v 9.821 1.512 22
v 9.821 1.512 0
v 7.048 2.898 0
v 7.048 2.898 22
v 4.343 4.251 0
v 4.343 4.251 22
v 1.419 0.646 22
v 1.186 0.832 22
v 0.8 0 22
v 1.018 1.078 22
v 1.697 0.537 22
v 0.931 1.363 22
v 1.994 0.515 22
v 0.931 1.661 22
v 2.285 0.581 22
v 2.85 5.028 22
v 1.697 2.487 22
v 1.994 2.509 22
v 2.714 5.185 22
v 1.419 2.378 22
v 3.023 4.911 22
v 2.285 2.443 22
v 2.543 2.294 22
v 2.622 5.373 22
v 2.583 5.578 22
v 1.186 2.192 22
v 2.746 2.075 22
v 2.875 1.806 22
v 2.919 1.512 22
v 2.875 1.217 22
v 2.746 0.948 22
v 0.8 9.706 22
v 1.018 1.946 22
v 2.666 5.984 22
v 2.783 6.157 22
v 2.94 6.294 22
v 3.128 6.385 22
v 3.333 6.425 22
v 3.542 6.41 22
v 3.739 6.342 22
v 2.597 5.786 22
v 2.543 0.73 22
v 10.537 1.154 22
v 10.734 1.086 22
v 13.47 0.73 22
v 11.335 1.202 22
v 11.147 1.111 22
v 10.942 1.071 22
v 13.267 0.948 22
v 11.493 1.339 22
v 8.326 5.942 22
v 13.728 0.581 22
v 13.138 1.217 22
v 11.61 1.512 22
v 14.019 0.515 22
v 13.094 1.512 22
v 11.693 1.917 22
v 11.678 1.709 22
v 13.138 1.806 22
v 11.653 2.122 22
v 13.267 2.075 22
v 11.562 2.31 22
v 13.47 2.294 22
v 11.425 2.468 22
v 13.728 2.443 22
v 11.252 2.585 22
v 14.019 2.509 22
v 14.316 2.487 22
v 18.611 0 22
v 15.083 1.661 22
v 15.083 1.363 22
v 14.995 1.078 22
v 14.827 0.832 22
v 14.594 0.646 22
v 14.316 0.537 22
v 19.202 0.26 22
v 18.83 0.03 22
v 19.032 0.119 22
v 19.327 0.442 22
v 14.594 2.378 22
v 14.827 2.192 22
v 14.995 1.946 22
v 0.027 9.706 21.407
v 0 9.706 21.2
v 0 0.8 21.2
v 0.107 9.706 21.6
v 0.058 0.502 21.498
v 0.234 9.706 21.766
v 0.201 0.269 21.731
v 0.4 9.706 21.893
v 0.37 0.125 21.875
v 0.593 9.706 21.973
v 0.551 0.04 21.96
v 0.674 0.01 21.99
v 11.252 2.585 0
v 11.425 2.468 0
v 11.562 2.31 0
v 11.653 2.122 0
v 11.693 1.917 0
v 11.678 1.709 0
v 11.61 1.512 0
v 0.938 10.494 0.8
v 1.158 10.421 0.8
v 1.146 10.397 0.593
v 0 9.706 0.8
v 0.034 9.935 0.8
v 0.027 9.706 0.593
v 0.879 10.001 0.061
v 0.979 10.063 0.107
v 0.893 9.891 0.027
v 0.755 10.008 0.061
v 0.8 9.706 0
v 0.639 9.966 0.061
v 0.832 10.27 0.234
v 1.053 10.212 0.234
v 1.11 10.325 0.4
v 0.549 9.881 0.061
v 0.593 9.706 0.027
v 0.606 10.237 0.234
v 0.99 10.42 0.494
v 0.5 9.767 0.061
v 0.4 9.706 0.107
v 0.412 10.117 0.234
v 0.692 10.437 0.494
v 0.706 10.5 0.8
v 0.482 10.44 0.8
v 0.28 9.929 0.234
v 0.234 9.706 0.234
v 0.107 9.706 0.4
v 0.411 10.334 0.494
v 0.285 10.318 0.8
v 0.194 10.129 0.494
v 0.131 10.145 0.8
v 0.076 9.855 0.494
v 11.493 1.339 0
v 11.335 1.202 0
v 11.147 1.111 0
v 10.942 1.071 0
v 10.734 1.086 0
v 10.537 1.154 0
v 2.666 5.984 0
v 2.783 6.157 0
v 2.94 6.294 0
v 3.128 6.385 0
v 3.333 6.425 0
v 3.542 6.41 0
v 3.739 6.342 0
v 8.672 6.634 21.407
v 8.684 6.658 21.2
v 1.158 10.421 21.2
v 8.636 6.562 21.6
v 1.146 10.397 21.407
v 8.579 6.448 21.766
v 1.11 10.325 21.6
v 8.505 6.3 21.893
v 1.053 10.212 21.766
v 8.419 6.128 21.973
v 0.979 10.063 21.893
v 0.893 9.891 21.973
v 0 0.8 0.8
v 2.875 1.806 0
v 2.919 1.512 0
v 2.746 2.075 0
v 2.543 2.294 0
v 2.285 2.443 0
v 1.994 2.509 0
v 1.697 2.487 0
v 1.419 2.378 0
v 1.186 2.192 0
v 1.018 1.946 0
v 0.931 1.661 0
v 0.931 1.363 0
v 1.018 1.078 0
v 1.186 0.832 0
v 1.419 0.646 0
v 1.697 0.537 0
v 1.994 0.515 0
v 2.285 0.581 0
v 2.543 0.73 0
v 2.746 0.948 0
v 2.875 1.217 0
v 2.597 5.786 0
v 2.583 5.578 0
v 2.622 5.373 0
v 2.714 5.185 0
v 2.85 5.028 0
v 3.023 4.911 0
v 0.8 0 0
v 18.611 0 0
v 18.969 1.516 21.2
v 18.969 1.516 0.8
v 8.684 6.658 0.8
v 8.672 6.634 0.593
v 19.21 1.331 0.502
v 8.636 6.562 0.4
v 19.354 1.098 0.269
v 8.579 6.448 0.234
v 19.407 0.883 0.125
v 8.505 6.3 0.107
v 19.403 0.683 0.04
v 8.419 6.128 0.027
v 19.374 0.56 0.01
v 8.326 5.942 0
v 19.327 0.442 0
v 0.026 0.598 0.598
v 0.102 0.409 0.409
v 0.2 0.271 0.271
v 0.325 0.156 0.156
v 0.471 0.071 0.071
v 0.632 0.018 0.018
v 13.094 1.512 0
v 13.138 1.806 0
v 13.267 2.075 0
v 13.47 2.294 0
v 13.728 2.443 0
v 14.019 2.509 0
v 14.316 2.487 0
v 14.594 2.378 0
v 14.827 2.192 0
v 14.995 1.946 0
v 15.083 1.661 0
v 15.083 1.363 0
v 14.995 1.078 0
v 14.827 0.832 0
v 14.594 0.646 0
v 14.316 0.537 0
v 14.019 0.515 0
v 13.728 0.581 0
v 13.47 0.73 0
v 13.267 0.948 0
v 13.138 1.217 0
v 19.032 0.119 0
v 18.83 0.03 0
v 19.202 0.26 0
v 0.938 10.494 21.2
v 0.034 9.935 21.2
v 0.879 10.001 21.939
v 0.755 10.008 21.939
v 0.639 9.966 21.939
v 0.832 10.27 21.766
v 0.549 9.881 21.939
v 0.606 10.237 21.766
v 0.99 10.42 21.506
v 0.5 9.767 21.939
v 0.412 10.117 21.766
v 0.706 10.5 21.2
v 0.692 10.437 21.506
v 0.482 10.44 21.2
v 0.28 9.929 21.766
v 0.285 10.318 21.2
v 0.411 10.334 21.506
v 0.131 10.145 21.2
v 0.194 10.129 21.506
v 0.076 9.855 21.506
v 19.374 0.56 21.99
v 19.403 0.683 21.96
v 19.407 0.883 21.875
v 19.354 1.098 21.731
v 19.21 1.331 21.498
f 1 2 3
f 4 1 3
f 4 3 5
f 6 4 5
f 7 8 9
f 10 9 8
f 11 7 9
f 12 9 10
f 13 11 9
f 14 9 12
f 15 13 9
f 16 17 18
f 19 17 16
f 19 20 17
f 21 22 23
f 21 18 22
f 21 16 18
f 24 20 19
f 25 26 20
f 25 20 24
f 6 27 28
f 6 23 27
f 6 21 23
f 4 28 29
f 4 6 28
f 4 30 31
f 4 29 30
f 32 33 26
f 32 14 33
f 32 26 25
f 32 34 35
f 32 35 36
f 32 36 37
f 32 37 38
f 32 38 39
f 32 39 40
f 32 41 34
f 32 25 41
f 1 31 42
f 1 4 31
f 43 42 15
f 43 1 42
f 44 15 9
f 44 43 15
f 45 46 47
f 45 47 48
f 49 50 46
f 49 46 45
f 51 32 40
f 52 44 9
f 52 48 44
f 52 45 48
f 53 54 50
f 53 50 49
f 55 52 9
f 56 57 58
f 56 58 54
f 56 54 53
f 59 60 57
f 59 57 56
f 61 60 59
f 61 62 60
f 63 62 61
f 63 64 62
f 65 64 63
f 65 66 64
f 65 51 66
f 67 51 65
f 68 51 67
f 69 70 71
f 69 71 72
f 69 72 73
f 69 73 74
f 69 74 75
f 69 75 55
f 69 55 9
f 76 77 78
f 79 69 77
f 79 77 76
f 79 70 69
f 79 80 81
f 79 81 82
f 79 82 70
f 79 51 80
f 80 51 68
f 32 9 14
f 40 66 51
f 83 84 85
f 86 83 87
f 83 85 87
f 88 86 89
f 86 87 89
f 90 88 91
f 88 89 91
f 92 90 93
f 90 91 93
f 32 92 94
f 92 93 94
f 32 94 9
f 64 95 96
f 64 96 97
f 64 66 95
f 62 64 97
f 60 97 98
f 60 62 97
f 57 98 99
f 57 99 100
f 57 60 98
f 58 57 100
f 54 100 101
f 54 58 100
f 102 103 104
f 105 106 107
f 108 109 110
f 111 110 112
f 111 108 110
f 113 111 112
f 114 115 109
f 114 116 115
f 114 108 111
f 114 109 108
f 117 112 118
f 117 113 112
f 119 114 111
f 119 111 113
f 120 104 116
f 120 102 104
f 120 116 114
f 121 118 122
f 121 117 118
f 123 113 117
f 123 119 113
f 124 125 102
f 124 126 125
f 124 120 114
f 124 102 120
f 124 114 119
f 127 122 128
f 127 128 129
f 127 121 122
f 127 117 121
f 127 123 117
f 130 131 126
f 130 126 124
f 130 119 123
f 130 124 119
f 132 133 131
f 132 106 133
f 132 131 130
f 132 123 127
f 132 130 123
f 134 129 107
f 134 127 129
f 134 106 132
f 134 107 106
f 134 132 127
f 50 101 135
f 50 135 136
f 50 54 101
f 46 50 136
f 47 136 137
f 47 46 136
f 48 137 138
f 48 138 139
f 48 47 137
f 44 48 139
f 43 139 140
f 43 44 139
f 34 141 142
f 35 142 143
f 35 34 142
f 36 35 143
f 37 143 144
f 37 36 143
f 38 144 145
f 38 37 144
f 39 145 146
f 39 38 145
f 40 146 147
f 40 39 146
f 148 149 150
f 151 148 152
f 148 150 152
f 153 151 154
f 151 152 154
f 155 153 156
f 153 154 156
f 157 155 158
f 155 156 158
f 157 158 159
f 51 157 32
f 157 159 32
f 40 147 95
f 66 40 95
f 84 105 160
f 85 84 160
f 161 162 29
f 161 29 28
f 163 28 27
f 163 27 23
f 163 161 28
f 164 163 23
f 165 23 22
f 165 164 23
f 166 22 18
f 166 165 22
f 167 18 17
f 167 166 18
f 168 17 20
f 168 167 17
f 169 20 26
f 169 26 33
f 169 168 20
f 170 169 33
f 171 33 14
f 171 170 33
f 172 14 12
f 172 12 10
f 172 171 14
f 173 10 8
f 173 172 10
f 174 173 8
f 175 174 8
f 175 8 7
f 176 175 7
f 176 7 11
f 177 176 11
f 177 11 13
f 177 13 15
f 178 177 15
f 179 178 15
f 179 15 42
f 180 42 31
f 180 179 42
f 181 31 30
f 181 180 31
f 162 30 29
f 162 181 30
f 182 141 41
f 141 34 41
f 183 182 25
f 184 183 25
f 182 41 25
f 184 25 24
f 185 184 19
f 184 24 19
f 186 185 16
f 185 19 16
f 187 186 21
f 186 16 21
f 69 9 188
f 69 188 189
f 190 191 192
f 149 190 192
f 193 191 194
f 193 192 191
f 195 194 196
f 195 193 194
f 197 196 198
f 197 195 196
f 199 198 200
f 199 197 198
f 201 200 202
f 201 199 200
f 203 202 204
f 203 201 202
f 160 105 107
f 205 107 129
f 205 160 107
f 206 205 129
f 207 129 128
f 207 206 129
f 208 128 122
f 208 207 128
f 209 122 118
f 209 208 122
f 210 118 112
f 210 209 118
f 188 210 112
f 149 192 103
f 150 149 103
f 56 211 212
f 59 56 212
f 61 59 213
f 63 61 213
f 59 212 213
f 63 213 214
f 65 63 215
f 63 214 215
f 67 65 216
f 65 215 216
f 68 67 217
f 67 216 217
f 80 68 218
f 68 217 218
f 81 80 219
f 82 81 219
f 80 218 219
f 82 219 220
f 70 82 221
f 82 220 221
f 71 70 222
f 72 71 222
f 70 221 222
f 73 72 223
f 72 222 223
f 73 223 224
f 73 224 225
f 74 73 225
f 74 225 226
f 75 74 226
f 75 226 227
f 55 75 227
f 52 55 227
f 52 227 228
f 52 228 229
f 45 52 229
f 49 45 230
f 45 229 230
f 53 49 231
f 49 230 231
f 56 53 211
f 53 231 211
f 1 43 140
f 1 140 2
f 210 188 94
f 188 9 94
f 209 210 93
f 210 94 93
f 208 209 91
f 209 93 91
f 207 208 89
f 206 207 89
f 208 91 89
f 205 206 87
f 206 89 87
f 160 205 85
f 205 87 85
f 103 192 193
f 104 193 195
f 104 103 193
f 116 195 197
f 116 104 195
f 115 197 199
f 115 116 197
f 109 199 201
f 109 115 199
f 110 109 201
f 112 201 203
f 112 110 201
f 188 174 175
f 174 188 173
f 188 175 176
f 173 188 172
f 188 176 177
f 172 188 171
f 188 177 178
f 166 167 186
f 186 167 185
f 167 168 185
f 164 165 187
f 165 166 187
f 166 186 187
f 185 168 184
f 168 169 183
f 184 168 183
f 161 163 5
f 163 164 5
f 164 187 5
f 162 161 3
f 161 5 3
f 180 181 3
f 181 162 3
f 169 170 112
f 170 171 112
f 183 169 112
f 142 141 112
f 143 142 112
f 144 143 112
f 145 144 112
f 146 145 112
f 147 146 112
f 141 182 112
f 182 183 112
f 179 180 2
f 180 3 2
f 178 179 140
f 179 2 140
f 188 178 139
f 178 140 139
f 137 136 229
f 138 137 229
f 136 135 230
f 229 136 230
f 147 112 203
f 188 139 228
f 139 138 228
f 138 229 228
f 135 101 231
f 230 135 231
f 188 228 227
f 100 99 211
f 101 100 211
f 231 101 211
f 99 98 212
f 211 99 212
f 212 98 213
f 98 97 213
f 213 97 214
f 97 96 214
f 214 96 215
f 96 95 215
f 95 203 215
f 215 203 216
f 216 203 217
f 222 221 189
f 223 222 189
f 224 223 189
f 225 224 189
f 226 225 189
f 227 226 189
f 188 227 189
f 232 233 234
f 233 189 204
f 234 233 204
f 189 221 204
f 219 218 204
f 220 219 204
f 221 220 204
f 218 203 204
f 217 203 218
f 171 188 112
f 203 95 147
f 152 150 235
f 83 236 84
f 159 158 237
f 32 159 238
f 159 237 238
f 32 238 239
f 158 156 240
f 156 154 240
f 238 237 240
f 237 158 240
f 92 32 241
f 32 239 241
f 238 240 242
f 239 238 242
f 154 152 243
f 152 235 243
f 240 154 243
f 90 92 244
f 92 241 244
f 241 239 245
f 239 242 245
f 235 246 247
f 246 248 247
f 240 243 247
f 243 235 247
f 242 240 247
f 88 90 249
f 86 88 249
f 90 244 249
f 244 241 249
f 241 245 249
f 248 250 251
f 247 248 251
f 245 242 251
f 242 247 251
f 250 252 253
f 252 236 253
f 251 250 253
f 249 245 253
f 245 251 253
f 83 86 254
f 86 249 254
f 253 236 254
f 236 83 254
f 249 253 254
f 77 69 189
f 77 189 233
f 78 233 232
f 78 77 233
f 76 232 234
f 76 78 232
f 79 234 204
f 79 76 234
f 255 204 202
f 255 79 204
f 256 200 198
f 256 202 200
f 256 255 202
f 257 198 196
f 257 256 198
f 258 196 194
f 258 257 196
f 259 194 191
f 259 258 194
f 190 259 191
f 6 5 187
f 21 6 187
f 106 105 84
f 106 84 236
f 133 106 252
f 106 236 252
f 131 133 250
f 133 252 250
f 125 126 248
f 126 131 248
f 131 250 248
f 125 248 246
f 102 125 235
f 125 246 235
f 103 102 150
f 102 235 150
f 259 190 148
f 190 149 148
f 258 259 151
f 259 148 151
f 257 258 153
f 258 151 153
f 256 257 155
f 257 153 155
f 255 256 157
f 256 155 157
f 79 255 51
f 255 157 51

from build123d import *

# Parameters (mm, degrees)
F0_R     = 1
F1_DEPTH = 22
F3_R     = 0.79999


# Not quite as in the source:
# - a fillet or chamfer is up to 0.001 mm smaller than in the source, because OpenCascade refuses the exact size
# - a feature of the source that left no trace in its solid (it failed there, or was rolled back) is left out


with BuildPart() as f1:
    # F0 (on Top) → F1 (new body)
    with BuildSketch(Plane.XY):
        Polygon((0, 10), (0, 0), (20, 0), (22, 0), (8.6841676623, 6.6579161689), (0, 11), align=None)
        with Locations((1.9193962216, 1.5117339551)):
            Circle(F0_R, mode=Mode.SUBTRACT)
        Polygon((3.0234679102, 6.6994116629), (9.2844582472, 3.5689164944), (11.9677398202, 2.2272757079), (11.6099689438, 1.5117339551), (11.2521980674, 0.7961922023), (9.8211145618, 1.5117339551), (7.0483902697, 2.8980961012), (4.3426890694, 4.2509467013), (2.3079261574, 5.2683281573), align=None, mode=Mode.SUBTRACT)
        with BuildLine():
            ThreePointArc((15.0937268734, 1.5117339551), (14.0937268734, 0.5117339551), (13.0937268734, 1.5117339551))
            ThreePointArc((13.0937268734, 1.5117339551), (14.0937268734, 2.5117339551), (15.0937268734, 1.5117339551))
        make_face(mode=Mode.SUBTRACT)
    extrude(amount=F1_DEPTH)

    # F3 (radius 0.8 in the source; OpenCascade refuses exactly that, so slightly less here)
    f3_edges = [f1.edges().sort_by_distance(p)[0] for p in [
        (0, 11, 11),
        (22, 0, 11),
        (11, 5.5, 0),
        (11, 5.5, 22),
        (0, 5.5, 22),
        (2.307926, 5.268328, 11),
        (3.023468, 6.699412, 11),
        (11.252198, 0.796192, 11),
        (11.96774, 2.227276, 11),
        (0, 0, 11),
        (0, 5.5, 0),
    ]]
    fillet(f3_edges, radius=F3_R)


solid = f1.part
